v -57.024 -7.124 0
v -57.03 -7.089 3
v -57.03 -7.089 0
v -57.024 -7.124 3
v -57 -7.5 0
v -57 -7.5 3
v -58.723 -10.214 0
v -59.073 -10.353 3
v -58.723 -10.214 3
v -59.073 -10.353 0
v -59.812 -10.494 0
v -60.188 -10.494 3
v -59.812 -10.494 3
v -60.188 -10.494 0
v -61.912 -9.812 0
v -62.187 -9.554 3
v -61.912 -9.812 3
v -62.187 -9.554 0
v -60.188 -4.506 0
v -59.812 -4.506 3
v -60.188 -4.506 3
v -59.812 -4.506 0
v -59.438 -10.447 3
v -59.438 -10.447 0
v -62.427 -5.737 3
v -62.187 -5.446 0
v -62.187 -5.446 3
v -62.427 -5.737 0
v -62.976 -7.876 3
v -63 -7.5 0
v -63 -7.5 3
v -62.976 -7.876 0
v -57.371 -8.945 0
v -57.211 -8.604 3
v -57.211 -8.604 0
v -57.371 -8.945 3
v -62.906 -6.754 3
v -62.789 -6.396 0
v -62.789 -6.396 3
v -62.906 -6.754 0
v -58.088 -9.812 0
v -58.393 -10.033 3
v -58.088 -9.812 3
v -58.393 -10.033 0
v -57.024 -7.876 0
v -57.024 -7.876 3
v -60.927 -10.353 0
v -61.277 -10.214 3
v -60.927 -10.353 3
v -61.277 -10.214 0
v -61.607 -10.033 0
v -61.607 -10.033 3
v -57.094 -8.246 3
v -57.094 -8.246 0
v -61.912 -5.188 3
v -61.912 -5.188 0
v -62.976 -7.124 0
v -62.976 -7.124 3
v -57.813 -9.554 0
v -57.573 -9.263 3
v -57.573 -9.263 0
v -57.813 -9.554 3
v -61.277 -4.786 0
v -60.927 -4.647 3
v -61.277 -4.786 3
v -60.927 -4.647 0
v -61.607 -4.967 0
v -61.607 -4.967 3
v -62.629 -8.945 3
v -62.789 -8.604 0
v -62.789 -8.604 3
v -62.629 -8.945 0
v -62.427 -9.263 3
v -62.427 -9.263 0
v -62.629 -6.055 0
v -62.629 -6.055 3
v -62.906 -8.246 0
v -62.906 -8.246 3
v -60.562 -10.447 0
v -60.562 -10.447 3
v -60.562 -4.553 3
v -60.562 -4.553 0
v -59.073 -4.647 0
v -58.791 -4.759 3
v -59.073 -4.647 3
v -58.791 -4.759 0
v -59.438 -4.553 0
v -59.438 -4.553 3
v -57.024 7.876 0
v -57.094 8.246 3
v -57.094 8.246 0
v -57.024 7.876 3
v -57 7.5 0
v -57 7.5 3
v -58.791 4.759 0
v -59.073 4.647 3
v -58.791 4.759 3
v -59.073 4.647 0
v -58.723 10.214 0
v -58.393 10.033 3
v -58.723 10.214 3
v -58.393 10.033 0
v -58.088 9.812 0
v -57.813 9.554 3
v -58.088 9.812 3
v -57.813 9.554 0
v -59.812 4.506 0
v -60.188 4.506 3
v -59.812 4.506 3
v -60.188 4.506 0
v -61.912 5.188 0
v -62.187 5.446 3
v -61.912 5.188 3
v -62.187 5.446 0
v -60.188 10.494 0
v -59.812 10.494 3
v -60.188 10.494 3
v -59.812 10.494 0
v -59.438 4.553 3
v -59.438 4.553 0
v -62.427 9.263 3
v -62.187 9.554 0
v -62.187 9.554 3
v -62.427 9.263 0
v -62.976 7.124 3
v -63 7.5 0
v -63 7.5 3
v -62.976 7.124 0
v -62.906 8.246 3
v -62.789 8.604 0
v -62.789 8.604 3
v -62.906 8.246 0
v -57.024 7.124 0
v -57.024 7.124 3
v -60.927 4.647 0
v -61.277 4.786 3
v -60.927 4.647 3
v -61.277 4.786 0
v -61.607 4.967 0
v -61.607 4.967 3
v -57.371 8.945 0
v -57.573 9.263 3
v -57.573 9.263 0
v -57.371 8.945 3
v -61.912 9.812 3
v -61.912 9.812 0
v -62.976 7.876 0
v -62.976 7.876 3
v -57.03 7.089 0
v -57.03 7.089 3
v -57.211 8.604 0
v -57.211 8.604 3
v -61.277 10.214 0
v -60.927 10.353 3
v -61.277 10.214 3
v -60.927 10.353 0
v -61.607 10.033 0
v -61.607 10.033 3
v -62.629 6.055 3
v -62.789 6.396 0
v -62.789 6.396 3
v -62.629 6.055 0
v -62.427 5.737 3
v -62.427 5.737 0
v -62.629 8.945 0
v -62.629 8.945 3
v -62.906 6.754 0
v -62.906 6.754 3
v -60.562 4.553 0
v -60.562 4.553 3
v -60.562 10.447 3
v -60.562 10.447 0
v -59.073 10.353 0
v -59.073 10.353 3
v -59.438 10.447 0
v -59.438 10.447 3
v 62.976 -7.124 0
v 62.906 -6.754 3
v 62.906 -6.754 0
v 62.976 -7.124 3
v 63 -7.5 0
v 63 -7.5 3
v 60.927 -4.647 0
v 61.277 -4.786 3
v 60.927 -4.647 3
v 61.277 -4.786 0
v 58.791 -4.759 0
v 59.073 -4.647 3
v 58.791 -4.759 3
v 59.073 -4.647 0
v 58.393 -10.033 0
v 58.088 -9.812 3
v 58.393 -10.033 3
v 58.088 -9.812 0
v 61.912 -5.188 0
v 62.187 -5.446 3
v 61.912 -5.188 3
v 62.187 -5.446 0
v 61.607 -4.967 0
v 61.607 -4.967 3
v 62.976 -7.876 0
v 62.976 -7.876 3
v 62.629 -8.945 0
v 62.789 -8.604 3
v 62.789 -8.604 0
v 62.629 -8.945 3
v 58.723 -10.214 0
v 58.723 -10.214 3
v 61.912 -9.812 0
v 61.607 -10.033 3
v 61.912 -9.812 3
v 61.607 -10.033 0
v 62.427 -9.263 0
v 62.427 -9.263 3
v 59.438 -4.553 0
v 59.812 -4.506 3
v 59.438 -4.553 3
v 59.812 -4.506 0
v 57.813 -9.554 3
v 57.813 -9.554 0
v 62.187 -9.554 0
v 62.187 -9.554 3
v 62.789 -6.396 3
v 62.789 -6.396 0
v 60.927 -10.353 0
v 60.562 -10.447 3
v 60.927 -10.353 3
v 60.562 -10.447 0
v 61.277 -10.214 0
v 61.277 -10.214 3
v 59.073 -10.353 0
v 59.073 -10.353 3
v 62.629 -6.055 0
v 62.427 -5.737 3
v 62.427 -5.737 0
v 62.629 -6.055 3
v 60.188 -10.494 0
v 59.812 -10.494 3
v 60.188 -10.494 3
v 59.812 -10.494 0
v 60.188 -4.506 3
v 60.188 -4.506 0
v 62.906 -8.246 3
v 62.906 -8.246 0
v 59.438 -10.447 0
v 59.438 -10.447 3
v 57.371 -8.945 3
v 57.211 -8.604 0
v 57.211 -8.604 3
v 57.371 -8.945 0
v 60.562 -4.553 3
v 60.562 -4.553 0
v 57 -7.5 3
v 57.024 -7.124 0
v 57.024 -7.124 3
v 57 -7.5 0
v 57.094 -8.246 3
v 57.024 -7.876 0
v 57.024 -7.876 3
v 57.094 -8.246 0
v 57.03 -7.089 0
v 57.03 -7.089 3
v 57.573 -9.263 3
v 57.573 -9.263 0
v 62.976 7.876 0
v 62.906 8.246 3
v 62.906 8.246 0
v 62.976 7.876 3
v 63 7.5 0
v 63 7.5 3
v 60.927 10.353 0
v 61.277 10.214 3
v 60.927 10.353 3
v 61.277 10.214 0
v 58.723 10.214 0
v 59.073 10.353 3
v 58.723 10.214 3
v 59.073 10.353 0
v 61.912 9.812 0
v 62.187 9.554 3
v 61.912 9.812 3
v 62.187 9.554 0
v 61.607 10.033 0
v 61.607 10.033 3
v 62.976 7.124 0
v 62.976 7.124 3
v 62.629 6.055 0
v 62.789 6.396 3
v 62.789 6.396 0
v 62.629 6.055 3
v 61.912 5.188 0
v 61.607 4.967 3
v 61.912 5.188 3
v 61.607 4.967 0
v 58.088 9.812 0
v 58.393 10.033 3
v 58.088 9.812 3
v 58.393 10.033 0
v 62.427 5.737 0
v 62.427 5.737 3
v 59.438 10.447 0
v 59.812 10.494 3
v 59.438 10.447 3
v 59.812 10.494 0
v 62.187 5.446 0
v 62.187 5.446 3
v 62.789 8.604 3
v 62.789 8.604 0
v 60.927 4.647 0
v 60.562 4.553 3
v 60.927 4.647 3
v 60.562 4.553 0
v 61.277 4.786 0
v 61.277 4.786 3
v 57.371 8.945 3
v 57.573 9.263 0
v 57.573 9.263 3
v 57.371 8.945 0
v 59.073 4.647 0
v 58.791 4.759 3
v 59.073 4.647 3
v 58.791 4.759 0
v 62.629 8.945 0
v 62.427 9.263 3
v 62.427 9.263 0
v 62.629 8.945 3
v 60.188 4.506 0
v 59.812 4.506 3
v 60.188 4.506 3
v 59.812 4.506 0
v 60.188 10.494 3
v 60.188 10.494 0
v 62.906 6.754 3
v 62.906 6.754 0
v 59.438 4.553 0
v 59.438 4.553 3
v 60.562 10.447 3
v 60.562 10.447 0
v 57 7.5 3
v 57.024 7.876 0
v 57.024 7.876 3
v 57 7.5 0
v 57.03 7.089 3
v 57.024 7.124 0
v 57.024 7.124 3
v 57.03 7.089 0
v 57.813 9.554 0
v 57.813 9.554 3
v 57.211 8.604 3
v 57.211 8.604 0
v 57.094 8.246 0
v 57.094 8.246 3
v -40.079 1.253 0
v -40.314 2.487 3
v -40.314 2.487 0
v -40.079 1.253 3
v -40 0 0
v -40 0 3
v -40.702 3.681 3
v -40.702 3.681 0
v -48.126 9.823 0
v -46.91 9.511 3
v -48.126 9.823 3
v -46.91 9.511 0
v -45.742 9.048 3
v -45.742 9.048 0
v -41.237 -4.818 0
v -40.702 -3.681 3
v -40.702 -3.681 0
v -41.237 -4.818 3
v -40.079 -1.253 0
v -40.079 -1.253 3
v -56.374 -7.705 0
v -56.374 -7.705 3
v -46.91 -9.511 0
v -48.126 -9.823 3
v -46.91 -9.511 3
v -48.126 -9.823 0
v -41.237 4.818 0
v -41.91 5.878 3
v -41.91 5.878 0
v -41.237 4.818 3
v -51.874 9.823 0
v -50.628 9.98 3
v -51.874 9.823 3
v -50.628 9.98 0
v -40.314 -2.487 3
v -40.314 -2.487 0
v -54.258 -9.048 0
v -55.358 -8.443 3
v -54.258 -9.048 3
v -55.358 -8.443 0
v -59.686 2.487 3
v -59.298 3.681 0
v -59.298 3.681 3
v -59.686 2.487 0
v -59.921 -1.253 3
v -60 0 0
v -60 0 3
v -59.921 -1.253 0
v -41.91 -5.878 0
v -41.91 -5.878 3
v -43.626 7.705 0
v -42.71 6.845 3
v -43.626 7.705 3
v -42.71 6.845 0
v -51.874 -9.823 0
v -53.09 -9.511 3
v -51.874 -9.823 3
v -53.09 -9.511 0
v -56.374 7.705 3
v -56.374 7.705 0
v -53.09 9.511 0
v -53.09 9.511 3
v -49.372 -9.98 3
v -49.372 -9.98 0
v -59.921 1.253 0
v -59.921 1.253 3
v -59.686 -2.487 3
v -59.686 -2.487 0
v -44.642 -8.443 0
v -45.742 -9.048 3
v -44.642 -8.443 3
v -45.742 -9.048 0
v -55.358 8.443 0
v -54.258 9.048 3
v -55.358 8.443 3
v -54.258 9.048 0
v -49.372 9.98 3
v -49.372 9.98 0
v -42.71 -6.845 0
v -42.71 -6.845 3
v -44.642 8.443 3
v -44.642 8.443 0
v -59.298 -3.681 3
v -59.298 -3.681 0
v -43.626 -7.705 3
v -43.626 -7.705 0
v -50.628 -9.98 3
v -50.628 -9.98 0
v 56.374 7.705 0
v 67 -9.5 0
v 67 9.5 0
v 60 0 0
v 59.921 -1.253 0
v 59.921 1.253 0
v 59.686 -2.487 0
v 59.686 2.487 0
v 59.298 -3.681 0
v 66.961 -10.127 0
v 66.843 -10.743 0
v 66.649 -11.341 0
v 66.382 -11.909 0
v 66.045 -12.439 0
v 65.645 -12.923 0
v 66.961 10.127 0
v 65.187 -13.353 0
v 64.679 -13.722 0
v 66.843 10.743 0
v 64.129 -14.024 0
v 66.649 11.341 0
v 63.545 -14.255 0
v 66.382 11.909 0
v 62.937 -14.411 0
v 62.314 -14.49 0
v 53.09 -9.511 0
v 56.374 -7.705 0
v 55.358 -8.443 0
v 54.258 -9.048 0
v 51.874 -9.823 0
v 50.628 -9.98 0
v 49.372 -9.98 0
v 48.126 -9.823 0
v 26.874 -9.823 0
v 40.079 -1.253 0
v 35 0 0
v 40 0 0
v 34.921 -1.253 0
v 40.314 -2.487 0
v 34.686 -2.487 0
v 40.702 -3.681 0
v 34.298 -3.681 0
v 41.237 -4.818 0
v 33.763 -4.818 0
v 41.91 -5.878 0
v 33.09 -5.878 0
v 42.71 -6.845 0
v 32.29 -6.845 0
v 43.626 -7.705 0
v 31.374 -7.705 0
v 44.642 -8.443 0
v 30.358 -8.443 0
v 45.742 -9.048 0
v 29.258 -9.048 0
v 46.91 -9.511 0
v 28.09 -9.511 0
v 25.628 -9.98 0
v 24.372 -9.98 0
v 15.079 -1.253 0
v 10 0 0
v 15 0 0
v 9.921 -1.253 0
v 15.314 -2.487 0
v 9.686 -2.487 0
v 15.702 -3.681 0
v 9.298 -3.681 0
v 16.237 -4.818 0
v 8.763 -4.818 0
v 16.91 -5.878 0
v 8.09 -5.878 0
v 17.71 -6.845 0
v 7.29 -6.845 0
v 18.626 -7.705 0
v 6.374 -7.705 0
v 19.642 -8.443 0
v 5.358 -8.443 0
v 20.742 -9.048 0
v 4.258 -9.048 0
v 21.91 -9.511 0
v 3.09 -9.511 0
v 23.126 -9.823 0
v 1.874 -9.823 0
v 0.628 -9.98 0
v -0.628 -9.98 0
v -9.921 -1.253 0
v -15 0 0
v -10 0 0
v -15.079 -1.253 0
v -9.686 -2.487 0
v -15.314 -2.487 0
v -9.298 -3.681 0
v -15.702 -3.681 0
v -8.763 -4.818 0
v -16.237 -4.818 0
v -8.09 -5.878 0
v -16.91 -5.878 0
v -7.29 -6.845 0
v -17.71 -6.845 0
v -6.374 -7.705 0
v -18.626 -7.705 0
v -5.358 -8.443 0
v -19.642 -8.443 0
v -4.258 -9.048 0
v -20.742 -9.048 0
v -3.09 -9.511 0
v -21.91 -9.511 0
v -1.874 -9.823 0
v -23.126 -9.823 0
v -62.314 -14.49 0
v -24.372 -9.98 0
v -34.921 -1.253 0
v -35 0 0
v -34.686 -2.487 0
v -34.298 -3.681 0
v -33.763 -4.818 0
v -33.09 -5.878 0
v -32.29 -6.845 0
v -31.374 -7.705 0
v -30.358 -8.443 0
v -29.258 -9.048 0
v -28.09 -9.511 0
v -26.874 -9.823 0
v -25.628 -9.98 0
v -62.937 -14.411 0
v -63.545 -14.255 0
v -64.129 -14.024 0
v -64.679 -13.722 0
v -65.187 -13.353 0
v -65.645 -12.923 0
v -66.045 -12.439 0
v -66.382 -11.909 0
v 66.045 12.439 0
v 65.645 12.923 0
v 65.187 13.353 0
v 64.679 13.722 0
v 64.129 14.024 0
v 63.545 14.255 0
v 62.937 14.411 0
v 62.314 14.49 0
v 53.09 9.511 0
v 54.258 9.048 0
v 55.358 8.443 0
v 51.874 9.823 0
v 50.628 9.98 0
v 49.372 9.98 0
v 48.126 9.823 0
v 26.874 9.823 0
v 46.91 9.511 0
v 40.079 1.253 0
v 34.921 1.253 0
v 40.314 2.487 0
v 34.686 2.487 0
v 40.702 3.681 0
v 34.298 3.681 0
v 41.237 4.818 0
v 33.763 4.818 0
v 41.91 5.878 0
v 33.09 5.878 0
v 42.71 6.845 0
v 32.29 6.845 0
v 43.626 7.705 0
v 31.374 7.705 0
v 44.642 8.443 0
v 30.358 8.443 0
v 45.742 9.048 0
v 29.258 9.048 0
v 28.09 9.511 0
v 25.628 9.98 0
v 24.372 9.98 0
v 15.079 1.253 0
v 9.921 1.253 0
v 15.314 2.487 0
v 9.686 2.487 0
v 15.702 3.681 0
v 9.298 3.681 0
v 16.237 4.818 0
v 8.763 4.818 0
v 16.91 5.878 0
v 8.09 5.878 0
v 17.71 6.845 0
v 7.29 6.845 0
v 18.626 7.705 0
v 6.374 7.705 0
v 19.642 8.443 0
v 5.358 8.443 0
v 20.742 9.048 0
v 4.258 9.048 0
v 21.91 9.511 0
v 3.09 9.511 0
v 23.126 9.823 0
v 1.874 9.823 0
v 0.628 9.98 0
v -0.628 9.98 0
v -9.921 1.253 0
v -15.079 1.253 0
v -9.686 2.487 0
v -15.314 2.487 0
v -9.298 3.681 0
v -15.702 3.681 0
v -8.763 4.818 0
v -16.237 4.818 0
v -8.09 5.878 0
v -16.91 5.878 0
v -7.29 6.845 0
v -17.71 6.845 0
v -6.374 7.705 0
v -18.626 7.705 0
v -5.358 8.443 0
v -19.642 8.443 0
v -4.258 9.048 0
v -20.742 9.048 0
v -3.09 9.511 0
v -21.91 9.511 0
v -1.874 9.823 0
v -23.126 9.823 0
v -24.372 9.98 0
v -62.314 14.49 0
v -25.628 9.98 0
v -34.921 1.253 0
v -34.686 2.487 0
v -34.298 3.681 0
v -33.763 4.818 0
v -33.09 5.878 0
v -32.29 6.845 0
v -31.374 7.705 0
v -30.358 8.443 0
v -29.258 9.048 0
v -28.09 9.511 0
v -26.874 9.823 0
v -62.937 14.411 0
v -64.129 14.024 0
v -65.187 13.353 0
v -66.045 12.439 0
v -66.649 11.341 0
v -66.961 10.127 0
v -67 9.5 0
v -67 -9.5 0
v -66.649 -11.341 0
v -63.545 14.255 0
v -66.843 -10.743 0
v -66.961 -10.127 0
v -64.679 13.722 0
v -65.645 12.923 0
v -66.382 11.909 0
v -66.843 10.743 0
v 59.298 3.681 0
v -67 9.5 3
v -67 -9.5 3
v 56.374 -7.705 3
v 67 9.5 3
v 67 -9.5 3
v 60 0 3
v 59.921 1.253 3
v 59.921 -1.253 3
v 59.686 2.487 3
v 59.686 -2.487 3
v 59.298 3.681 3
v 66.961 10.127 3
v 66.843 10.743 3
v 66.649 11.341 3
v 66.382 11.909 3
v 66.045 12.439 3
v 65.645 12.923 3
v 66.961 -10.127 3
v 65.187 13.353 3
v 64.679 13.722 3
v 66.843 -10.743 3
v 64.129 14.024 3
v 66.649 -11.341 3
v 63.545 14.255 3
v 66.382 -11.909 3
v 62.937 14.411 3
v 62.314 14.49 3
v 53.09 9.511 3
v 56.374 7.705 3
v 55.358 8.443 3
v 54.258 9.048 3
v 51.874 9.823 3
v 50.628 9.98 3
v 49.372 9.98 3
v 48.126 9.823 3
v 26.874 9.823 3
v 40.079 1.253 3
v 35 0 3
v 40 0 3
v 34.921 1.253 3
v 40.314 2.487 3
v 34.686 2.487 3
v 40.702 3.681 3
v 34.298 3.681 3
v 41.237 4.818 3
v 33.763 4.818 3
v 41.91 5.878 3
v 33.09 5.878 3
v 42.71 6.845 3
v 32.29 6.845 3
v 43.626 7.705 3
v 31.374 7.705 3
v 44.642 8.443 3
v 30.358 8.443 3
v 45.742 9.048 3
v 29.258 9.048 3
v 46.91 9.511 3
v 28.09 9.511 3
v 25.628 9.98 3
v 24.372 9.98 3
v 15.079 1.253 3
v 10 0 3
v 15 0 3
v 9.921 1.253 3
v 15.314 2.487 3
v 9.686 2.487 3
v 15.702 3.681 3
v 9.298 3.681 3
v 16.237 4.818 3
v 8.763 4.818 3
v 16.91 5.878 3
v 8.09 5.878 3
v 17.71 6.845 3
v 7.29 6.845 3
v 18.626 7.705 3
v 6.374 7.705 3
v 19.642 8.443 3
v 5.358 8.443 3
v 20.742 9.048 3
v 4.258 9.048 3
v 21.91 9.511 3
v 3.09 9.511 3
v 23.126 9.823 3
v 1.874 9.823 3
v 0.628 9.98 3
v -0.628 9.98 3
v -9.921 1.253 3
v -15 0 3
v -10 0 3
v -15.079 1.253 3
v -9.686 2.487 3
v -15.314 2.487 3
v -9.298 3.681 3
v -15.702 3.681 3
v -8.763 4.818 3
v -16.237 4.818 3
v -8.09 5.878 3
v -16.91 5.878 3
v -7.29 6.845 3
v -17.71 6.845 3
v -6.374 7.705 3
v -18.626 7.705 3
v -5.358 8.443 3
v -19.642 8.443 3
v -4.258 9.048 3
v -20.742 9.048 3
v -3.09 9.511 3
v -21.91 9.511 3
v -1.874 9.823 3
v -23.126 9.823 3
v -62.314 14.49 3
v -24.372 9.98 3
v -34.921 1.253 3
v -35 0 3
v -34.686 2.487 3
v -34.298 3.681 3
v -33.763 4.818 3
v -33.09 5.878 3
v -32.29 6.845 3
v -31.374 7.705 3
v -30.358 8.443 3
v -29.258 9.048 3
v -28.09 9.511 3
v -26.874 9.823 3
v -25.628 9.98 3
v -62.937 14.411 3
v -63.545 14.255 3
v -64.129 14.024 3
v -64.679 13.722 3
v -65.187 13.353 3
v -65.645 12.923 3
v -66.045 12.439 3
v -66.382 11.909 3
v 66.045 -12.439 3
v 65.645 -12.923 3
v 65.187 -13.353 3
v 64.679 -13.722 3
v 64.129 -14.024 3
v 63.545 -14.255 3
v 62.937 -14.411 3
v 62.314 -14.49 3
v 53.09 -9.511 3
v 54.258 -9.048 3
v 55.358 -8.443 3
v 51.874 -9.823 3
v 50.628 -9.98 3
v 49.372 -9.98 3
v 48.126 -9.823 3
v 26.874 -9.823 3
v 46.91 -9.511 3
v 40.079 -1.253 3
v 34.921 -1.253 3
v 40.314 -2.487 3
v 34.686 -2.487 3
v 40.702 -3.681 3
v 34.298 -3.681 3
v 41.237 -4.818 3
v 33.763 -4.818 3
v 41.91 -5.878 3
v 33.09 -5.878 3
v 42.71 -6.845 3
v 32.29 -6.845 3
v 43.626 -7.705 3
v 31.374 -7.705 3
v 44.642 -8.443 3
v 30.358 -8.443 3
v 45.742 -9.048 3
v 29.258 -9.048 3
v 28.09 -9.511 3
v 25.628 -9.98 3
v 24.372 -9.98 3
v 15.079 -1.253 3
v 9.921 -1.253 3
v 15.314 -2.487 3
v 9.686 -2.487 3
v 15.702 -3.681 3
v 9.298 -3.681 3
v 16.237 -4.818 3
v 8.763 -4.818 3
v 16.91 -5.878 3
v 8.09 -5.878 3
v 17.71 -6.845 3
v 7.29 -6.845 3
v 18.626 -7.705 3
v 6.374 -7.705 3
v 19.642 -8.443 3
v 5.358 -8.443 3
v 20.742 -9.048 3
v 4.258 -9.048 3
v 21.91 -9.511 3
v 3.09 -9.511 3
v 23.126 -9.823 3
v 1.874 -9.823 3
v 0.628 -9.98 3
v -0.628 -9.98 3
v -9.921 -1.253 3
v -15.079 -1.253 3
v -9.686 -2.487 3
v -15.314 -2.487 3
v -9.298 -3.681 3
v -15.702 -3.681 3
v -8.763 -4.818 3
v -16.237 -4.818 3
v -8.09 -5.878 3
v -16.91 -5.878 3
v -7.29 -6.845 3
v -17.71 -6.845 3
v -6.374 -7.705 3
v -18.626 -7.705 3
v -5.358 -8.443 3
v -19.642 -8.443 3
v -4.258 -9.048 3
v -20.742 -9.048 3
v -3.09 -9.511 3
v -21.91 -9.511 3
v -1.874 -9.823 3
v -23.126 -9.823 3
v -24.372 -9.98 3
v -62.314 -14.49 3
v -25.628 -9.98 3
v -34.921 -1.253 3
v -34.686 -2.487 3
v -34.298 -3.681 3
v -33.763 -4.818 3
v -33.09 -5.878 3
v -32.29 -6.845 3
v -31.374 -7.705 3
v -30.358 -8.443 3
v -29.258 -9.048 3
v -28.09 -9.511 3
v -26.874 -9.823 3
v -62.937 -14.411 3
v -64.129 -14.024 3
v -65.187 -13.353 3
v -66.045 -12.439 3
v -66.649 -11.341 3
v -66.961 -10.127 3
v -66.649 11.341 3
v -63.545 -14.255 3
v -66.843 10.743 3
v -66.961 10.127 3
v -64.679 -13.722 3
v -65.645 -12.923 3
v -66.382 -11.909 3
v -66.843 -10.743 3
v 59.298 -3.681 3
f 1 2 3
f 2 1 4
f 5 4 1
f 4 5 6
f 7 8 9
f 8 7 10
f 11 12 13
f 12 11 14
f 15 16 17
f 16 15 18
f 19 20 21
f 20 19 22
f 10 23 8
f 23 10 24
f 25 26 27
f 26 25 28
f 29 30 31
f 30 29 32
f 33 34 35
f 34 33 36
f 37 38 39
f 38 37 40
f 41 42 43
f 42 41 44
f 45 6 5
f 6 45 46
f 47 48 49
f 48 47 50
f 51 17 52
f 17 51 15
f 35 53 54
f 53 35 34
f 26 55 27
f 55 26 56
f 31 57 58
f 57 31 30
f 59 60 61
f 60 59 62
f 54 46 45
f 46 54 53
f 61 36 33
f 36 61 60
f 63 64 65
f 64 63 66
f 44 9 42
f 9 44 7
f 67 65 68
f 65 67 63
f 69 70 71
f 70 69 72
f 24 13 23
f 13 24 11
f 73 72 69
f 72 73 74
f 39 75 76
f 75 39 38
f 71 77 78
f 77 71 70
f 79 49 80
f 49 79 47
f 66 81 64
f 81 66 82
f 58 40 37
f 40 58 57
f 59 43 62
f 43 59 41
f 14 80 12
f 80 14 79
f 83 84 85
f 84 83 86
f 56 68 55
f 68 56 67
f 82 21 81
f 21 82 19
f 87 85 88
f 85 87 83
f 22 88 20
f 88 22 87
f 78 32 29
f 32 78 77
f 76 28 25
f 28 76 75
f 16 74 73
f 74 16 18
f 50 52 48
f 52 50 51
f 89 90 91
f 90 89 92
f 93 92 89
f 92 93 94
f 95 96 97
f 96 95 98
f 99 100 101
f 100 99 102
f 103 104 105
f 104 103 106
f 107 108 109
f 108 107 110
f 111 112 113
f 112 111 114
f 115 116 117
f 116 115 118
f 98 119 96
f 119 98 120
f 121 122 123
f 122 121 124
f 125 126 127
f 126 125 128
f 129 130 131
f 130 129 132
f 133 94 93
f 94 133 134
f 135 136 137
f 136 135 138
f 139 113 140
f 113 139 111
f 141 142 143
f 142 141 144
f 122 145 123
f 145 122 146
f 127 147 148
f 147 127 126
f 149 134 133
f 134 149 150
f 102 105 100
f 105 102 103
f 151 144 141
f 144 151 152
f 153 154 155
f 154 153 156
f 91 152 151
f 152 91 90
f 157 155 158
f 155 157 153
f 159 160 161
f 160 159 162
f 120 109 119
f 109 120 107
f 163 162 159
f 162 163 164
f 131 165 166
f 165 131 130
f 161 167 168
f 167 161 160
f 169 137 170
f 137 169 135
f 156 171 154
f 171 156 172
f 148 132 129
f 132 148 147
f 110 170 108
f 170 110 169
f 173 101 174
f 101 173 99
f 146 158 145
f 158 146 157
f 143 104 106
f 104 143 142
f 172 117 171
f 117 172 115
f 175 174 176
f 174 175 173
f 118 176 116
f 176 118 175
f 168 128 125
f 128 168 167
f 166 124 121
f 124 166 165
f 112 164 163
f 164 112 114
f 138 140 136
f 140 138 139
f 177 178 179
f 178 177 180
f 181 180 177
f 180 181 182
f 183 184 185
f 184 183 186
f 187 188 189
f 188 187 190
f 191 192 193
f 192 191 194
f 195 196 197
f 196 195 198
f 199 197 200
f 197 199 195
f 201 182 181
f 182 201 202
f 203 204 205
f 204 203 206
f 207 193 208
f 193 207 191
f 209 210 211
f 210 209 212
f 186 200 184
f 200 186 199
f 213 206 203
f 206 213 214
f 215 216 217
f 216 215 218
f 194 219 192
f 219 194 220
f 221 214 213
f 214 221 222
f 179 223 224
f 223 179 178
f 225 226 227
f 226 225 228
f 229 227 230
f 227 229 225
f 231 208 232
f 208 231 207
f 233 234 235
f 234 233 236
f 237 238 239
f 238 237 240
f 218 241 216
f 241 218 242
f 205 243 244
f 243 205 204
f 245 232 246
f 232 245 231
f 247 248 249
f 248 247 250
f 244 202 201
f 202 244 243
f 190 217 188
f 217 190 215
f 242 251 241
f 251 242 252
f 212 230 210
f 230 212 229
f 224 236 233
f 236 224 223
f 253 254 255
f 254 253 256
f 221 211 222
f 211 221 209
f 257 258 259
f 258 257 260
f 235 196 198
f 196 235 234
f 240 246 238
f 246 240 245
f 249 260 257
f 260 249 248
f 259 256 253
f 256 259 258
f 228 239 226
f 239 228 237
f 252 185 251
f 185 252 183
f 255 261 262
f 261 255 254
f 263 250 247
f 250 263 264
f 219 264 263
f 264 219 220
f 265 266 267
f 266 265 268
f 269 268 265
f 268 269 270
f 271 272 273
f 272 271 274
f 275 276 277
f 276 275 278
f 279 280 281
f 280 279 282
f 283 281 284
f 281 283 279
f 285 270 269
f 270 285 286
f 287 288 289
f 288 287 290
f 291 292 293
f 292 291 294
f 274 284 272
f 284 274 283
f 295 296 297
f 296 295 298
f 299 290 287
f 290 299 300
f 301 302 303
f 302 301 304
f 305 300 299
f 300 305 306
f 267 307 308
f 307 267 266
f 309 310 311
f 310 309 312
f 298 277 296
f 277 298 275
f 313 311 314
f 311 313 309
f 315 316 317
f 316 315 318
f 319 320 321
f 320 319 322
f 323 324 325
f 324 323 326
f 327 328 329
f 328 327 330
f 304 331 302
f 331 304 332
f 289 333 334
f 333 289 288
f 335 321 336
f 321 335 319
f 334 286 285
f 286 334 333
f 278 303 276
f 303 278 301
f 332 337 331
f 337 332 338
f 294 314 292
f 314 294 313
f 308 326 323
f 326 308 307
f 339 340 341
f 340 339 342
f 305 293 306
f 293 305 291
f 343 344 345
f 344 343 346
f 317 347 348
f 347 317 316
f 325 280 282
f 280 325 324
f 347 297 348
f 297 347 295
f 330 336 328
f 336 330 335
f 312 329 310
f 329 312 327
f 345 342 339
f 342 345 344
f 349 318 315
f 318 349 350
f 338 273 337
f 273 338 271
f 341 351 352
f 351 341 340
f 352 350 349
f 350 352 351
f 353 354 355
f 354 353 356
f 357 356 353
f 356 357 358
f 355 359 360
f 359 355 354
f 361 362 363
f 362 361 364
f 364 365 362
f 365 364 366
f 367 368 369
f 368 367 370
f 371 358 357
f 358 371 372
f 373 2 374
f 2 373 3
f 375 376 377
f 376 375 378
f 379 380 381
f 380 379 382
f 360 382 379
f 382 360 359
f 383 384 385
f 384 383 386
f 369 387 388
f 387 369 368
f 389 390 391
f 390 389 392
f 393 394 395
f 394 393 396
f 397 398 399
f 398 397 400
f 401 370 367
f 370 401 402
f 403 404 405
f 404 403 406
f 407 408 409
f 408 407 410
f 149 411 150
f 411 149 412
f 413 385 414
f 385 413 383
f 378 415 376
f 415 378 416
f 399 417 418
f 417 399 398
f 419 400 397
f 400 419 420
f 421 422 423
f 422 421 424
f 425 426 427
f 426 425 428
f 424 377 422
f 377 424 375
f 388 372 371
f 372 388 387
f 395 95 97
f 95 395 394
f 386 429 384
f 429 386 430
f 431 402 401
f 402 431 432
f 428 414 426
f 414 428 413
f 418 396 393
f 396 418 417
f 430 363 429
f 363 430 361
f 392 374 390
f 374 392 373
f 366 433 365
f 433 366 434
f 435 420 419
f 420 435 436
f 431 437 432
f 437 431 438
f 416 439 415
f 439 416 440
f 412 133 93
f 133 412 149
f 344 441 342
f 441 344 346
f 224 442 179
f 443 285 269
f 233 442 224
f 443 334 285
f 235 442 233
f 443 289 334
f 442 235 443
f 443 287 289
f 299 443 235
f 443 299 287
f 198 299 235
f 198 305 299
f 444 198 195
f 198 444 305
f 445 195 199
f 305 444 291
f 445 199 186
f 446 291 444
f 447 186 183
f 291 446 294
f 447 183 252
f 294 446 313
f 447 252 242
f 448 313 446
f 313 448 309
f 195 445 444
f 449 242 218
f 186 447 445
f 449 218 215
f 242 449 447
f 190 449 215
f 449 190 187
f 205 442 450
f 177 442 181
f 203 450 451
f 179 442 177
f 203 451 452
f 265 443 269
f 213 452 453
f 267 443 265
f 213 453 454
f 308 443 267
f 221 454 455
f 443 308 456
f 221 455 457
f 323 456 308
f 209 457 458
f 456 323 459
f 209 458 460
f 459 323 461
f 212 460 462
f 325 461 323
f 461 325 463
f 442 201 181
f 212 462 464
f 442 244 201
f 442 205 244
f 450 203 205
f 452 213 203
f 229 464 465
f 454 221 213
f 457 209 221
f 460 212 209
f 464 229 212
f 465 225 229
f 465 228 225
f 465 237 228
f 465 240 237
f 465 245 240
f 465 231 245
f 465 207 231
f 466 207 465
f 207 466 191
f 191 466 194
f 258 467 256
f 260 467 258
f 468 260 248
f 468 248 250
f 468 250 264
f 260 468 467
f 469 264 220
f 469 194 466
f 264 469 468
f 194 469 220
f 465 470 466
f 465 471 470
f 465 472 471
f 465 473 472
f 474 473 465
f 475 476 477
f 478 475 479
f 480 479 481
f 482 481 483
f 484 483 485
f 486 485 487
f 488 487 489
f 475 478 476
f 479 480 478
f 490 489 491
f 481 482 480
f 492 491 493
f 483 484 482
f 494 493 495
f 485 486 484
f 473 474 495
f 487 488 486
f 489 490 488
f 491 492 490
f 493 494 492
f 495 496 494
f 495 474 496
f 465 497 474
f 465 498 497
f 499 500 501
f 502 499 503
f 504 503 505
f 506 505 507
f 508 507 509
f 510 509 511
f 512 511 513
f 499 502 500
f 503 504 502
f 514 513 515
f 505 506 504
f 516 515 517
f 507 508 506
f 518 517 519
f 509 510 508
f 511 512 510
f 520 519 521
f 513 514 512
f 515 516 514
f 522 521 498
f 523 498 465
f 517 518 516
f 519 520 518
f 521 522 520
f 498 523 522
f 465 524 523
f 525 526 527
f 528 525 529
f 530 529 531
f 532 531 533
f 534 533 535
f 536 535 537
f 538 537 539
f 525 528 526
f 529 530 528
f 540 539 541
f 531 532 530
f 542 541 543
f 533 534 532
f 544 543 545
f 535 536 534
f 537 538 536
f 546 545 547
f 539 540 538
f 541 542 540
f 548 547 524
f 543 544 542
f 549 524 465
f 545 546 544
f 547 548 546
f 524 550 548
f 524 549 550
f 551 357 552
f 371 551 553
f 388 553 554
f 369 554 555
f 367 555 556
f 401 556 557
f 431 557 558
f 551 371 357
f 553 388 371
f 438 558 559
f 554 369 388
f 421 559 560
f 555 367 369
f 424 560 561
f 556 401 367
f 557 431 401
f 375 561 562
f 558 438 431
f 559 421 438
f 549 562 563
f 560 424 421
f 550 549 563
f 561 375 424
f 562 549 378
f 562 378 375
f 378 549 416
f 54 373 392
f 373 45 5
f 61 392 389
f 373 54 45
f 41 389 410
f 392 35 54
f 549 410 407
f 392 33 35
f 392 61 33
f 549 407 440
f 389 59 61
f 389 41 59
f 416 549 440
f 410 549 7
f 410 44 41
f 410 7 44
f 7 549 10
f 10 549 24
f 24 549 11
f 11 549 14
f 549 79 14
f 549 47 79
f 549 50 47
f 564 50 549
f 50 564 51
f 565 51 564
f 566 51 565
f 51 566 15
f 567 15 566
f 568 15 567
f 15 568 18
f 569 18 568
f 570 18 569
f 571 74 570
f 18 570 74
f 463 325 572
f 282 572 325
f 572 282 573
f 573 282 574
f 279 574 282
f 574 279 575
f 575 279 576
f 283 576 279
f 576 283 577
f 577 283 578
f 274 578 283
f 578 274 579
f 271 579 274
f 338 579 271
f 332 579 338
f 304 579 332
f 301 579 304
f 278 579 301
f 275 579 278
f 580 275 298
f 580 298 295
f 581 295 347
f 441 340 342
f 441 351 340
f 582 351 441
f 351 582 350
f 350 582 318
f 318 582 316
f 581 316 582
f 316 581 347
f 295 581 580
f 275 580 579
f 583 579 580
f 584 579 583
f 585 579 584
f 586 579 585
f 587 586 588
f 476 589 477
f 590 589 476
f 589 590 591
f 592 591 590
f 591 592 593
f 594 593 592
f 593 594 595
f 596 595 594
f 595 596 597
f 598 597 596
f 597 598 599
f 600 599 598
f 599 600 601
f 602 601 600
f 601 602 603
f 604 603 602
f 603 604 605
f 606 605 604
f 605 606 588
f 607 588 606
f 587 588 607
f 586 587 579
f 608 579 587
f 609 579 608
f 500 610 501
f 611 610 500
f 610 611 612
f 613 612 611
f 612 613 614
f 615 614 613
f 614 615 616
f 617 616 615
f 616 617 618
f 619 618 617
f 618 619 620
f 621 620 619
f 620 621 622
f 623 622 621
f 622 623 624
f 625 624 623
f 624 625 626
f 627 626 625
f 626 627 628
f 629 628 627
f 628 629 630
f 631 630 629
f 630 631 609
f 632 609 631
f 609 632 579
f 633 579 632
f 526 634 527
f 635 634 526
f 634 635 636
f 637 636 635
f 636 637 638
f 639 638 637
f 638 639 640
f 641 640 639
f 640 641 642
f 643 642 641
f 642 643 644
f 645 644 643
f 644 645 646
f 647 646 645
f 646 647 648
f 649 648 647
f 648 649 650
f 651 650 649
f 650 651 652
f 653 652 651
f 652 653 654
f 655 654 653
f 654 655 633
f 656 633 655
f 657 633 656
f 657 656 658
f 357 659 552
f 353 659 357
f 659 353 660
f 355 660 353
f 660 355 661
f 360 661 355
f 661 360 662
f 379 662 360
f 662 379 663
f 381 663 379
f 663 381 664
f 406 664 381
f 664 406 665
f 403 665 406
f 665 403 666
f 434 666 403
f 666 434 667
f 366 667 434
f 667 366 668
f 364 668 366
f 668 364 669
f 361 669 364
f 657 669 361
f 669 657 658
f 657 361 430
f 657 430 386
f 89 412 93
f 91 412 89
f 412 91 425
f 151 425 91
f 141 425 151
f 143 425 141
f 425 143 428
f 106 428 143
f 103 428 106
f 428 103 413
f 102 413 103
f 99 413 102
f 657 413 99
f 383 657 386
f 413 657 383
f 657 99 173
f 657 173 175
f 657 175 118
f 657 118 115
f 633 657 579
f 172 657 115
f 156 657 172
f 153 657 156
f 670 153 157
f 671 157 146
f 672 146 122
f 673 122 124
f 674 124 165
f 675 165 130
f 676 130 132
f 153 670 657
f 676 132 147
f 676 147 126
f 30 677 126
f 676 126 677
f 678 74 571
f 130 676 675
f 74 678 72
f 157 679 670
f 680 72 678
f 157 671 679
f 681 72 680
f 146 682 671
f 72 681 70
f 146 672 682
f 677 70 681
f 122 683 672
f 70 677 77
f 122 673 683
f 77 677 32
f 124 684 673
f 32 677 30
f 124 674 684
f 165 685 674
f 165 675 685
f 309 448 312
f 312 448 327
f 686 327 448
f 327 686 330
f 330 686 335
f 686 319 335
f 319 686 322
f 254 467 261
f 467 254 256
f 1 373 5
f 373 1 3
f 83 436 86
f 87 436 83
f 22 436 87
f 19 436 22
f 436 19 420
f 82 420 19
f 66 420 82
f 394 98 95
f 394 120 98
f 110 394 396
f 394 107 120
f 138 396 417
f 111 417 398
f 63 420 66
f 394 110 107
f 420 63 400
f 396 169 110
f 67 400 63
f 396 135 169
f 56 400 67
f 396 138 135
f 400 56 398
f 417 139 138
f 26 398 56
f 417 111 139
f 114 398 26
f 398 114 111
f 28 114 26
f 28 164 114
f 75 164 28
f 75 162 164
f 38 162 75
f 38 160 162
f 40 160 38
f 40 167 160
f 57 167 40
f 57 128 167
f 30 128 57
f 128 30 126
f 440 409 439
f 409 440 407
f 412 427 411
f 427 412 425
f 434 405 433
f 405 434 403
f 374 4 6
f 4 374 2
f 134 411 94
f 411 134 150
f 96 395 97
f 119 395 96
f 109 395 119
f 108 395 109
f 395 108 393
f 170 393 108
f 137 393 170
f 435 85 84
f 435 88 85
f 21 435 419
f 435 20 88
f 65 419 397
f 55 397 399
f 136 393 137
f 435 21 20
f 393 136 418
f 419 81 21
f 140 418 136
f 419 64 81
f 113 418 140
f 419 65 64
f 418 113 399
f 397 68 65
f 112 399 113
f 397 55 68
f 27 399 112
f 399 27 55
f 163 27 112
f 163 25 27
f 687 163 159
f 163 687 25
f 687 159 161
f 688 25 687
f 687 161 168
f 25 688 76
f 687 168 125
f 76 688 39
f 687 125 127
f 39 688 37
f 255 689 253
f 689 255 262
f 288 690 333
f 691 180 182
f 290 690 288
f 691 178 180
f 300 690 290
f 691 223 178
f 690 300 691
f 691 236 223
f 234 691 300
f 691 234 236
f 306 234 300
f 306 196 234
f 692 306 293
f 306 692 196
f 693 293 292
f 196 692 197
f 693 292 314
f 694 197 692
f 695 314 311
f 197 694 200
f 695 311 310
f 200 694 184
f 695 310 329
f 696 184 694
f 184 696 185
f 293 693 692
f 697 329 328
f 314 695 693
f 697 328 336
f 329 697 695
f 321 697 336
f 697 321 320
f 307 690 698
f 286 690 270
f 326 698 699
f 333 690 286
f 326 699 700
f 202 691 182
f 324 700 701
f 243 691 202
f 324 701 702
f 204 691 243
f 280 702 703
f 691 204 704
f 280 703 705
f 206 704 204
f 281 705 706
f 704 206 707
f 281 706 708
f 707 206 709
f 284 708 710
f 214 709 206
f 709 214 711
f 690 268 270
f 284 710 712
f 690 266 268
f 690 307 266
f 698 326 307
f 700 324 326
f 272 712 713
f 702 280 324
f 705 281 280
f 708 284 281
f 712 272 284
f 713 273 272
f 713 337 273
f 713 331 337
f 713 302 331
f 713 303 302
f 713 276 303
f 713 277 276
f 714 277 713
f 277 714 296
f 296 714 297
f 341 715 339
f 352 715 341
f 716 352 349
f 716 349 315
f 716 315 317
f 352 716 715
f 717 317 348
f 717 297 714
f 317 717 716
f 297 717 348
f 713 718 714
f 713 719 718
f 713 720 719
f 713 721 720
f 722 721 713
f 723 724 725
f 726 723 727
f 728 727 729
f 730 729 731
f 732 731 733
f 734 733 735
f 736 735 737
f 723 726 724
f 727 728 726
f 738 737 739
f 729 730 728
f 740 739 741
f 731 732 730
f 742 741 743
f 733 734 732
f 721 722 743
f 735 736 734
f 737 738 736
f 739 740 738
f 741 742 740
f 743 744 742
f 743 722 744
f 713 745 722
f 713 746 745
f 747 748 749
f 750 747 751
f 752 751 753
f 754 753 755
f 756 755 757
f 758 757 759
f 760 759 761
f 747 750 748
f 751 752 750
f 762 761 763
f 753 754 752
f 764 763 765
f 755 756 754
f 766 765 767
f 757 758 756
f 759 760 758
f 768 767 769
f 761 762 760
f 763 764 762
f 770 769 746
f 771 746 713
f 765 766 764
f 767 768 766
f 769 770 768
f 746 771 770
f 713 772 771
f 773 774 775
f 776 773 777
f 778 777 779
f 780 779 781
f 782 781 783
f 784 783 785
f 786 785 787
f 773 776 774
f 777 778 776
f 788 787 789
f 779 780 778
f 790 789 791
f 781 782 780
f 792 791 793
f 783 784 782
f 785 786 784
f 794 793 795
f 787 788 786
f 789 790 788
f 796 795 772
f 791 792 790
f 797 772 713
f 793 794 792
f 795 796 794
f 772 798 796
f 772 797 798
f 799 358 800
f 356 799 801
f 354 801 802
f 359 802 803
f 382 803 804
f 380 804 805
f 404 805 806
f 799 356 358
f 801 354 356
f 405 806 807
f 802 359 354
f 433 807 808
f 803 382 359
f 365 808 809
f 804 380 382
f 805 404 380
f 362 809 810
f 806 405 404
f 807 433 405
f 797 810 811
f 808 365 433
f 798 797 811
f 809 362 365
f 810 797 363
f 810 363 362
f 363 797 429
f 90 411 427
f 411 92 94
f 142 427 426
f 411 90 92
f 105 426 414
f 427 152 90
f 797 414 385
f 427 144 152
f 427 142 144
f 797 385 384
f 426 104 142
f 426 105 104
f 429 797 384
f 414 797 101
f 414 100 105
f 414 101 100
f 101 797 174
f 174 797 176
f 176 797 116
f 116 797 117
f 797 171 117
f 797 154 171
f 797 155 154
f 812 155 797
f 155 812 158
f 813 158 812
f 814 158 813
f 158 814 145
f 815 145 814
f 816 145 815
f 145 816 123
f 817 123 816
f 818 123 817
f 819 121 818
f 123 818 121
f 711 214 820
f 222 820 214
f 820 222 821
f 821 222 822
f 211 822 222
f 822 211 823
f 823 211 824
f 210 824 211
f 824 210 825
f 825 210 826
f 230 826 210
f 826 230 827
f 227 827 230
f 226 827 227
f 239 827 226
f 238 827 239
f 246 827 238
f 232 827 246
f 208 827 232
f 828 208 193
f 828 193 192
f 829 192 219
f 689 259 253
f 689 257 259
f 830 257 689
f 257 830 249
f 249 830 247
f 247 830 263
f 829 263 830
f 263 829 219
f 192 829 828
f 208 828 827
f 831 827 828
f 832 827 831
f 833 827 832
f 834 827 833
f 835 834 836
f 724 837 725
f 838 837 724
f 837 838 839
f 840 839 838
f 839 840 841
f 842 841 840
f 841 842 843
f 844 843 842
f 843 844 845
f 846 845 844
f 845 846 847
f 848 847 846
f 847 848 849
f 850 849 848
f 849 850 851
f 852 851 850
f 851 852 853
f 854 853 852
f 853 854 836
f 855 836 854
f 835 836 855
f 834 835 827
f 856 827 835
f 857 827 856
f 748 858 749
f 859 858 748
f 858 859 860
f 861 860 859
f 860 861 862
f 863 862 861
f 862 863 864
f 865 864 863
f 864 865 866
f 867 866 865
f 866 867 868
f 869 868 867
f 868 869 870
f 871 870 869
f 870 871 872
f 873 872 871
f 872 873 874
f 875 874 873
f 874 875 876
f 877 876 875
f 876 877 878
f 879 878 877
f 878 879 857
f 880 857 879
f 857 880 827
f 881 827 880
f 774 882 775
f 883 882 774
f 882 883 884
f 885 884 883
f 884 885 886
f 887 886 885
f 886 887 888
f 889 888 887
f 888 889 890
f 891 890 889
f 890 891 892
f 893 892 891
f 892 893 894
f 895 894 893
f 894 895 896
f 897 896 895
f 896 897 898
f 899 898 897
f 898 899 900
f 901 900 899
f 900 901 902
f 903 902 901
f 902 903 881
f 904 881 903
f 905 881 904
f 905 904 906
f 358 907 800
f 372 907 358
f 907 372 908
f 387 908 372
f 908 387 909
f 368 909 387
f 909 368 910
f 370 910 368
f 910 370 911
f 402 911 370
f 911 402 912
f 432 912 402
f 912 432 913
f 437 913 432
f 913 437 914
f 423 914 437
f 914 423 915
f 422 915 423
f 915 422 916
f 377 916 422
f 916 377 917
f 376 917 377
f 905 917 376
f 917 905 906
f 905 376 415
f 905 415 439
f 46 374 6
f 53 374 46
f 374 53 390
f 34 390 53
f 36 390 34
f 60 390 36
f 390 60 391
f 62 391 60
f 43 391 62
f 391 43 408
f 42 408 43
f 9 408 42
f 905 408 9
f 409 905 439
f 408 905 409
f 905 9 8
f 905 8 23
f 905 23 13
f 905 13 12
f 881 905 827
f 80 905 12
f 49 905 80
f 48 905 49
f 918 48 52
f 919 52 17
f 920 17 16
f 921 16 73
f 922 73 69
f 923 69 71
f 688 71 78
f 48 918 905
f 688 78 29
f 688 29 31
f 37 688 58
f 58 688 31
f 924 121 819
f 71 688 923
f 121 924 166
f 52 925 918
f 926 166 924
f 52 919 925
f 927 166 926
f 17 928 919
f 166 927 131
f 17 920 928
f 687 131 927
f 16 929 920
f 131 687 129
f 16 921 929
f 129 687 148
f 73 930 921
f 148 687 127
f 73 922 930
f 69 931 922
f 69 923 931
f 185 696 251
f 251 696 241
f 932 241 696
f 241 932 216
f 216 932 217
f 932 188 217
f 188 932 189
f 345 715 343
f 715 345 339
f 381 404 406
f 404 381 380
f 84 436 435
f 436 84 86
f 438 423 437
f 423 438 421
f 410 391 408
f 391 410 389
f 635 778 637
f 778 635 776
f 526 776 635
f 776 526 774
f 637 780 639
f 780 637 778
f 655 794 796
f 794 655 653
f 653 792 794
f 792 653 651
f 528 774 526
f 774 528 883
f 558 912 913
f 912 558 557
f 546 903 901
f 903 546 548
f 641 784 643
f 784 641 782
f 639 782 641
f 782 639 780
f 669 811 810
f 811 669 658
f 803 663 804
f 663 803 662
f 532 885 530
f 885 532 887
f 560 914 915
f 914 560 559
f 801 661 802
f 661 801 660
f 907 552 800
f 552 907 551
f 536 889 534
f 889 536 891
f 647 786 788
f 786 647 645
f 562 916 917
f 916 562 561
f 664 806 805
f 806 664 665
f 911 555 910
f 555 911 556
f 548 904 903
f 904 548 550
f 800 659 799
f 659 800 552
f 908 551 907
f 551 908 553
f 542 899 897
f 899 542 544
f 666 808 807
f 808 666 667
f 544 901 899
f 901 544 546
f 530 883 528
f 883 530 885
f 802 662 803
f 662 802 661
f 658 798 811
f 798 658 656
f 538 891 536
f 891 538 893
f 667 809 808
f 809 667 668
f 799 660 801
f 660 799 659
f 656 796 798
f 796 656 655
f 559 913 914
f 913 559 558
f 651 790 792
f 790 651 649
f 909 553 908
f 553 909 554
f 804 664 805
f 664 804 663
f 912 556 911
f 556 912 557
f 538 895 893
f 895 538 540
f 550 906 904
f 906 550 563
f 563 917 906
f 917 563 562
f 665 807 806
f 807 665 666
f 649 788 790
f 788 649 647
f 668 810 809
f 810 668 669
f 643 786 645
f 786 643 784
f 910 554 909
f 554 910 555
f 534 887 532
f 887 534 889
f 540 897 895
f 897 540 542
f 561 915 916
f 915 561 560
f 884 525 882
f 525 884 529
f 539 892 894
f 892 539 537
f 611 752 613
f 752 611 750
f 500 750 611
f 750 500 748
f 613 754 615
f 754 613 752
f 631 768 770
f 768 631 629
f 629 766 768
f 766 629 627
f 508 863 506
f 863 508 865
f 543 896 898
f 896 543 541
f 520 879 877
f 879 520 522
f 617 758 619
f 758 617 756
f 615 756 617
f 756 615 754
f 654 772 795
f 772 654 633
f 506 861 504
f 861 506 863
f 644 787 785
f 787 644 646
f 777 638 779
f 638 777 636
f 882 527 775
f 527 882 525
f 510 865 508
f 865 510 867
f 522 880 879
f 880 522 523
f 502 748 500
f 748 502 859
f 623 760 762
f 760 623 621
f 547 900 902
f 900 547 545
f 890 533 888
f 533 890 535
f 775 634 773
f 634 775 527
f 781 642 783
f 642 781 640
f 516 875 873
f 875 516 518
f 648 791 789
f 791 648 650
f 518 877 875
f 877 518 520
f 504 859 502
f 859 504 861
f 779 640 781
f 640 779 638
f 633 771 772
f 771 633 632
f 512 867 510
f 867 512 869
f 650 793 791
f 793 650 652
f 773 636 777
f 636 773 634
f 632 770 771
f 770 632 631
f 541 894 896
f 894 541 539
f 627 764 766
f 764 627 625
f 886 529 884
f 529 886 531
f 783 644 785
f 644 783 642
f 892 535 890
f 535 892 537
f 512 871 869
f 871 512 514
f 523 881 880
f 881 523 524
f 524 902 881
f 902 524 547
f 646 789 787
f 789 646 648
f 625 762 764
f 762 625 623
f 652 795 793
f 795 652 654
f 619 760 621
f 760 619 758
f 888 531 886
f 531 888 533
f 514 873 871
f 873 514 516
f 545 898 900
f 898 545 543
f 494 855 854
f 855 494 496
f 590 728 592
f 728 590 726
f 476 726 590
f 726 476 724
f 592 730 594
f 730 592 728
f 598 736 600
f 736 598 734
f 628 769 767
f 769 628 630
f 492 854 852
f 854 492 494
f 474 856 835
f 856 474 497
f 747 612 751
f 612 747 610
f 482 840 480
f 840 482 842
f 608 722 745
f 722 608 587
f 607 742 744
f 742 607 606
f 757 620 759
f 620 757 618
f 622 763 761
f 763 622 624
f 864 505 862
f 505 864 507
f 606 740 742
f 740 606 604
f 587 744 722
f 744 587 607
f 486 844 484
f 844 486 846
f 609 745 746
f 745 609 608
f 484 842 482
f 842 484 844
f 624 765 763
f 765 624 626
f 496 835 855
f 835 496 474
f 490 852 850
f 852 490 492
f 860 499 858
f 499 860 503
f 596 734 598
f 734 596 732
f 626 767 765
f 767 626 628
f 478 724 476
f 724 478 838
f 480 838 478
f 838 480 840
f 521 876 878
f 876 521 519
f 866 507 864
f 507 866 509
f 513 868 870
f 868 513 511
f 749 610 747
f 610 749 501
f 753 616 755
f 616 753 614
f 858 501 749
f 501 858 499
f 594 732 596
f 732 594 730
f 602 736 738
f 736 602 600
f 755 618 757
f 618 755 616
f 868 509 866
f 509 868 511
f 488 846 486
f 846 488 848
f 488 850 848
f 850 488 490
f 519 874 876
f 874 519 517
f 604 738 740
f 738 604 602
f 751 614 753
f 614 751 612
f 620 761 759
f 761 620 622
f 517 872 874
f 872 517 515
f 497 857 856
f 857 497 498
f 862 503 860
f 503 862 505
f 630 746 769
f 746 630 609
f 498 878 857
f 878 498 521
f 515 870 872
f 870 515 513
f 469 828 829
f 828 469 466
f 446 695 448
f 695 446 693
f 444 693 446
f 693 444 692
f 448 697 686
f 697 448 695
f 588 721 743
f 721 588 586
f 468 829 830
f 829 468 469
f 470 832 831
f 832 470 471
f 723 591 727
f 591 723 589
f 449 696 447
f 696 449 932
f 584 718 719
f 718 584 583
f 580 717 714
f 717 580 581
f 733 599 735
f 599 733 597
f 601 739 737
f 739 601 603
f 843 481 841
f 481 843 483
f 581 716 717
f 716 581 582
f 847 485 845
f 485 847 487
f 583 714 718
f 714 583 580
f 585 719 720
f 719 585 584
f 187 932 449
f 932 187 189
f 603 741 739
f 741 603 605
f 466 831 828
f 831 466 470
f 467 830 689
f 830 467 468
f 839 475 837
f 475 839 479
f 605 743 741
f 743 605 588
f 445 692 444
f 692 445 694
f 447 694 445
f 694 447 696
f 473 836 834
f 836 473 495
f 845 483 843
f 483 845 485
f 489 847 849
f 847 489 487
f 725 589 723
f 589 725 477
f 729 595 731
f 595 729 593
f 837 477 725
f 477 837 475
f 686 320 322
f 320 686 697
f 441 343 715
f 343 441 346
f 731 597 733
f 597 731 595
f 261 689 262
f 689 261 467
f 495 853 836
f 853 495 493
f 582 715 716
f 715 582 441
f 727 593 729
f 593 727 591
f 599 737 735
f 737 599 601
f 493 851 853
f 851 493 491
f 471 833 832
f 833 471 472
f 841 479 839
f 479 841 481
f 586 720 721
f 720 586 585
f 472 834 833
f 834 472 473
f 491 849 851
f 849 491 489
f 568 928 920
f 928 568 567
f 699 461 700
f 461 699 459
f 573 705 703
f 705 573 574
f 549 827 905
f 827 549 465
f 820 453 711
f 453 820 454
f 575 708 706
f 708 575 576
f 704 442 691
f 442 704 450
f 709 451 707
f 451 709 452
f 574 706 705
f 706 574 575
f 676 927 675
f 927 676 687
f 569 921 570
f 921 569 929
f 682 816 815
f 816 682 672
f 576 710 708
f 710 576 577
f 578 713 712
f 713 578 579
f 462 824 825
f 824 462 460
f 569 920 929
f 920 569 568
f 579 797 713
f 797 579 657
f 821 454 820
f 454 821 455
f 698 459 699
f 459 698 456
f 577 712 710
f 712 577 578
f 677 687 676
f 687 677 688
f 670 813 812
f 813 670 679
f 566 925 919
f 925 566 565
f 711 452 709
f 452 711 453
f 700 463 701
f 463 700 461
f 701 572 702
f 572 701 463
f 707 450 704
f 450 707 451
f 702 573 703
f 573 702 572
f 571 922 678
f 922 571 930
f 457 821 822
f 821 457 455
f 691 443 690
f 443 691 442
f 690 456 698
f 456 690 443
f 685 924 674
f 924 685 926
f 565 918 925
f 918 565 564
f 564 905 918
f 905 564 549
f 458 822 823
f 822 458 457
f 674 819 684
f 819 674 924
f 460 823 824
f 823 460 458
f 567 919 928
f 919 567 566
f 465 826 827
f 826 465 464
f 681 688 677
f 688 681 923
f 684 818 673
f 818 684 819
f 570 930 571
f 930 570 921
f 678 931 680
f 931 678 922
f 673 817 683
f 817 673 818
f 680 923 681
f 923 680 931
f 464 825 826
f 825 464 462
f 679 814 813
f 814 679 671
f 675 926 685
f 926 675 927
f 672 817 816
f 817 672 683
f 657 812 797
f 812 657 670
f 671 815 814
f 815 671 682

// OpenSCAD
$fn = 50;


difference() {
	union() {
		hull() {
			translate(v = [-62.0000000000, 9.5000000000, 0]) {
				cylinder(h = 3, r = 5);
			}
			translate(v = [62.0000000000, 9.5000000000, 0]) {
				cylinder(h = 3, r = 5);
			}
			translate(v = [-62.0000000000, -9.5000000000, 0]) {
				cylinder(h = 3, r = 5);
			}
			translate(v = [62.0000000000, -9.5000000000, 0]) {
				cylinder(h = 3, r = 5);
			}
		}
	}
	union() {
		#translate(v = [-60.0000000000, -7.5000000000, -100.0000000000]) {
			cylinder(h = 200, r = 3.0000000000);
		}
		#translate(v = [-60.0000000000, 7.5000000000, -100.0000000000]) {
			cylinder(h = 200, r = 3.0000000000);
		}
		#translate(v = [60.0000000000, -7.5000000000, -100.0000000000]) {
			cylinder(h = 200, r = 3.0000000000);
		}
		#translate(v = [60.0000000000, 7.5000000000, -100.0000000000]) {
			cylinder(h = 200, r = 3.0000000000);
		}
		#translate(v = [-50.0000000000, 0, 0]) {
			cylinder(h = 3, r = 10.0000000000);
		}
		#translate(v = [-25.0000000000, 0, 0]) {
			cylinder(h = 3, r = 10.0000000000);
		}
		#cylinder(h = 3, r = 10.0000000000);
		#translate(v = [25.0000000000, 0, 0]) {
			cylinder(h = 3, r = 10.0000000000);
		}
		#translate(v = [50.0000000000, 0, 0]) {
			cylinder(h = 3, r = 10.0000000000);
		}
	}
}
